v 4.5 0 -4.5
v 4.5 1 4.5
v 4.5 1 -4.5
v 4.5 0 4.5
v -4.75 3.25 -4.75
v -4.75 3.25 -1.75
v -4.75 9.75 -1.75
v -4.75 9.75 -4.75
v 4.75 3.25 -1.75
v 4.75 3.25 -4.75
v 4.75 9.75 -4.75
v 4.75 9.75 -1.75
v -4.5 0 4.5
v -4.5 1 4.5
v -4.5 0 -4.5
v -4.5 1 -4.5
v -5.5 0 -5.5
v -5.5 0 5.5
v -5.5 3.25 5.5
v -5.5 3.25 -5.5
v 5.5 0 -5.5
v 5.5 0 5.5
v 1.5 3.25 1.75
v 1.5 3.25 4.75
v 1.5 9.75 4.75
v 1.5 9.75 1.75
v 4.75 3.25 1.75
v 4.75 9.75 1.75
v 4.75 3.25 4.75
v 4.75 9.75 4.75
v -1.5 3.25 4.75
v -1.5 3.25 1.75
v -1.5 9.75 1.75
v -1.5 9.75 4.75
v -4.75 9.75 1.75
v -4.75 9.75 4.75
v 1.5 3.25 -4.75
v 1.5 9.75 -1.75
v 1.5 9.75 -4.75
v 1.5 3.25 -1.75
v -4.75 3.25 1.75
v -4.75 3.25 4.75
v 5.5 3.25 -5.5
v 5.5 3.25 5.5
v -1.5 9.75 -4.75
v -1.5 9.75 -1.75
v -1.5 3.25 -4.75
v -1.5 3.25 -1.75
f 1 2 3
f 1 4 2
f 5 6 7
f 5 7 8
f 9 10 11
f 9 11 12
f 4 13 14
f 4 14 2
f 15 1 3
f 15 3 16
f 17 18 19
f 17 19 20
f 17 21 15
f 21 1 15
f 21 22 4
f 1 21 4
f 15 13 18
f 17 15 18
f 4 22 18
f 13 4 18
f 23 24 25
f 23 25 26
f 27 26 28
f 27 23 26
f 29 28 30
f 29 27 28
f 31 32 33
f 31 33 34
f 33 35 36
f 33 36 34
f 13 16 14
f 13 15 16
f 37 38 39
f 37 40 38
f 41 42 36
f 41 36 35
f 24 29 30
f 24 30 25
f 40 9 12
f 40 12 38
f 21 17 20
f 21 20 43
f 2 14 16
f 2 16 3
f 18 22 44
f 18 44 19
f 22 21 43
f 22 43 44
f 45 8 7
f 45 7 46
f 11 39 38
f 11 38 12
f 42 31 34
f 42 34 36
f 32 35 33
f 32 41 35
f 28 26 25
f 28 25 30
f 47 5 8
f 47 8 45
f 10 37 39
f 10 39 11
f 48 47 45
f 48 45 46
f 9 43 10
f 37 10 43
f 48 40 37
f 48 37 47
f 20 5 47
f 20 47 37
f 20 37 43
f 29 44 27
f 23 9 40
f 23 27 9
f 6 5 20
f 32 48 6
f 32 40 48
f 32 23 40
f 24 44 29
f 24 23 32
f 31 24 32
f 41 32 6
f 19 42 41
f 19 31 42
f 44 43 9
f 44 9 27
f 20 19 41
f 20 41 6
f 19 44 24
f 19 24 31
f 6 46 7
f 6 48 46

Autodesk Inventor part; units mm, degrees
ref_plane "YZ Plane" through (0, 0, 0) normal (1, 0, 0) x (0, 1, 0)
ref_plane "XZ Plane" through (0, 0, 0) normal (0, 1, 0) x (-1, 0, 0)
ref_plane "XY Plane" through (0, 0, 0) normal (0, 0, 1) x (1, 0, 0)
sketch "Sketch1" plane through (0, 0, 0) normal (0, 1, 0) x (-1, 0, 0)
  line L0 (5.5, -5.5) -> (-5.5, -5.5)
  line L1 (-5.5, -5.5) -> (-5.5, 5.5)
  line L2 (-5.5, 5.5) -> (5.5, 5.5)
  line L3 (5.5, 5.5) -> (5.5, -5.5)
  line L4 (5.5, -5.5) -> (-5.5, 5.5) construction
  line L5 (-5.5, -5.5) -> (5.5, 5.5) construction
  point P0 (0, 0)
  dimension "d0" = 11
  dimension "d1" = 11
extrude "Extrusion1" add sketch "Sketch1" along normal blind 3.25
sketch "Sketch2" plane through (0, 0, 0) normal (0, -1, 0) x (1, 0, 0)
  line L0 (-4.5, 4.5) -> (4.5, 4.5)
  line L1 (4.5, 4.5) -> (4.5, -4.5)
  line L2 (4.5, -4.5) -> (-4.5, -4.5)
  line L3 (-4.5, -4.5) -> (-4.5, 4.5)
  line L4 (-4.5, 4.5) -> (4.5, -4.5) construction
  line L5 (4.5, 4.5) -> (-4.5, -4.5) construction
  point P0 (0, 0)
  dimension "d4" = 9
  dimension "d5" = 9
extrude "Extrusion2" cut sketch "Sketch2" against normal blind 1
sketch "Sketch3" plane through (0, 3.25, 0) normal (0, 1, 0) x (1, 0, 0)
  line L0 (-4.75, -1.75) -> (-1.5, -1.75)
  line L1 (-1.5, -1.75) -> (-1.5, -4.75)
  line L2 (-1.5, -4.75) -> (-4.75, -4.75)
  line L3 (-4.75, -4.75) -> (-4.75, -1.75)
  line L4 (-4.75, -1.75) -> (-1.5, -4.75) construction
  line L5 (-1.5, -1.75) -> (-4.75, -4.75) construction
  line L6 (-5.5, 5.5) -> (-5.5, -5.5) projected
  line L7 (-5.5, -5.5) -> (5.5, -5.5) projected
  line L8 (-4.75, 4.75) -> (-1.5, 4.75)
  line L9 (-4.75, 1.75) -> (-4.75, 4.75)
  line L10 (-1.5, 4.75) -> (-4.75, 1.75) construction
  line L11 (-1.5, 1.75) -> (-4.75, 1.75)
  line L12 (-1.5, 4.75) -> (-1.5, 1.75)
  line L13 (1.5, -1.75) -> (4.75, -1.75)
  line L14 (1.5, -4.75) -> (1.5, -1.75)
  line L15 (4.75, -1.75) -> (1.5, -4.75) construction
  line L16 (4.75, -4.75) -> (1.5, -4.75)
  line L17 (4.75, -1.75) -> (4.75, -4.75)
  line L18 (1.5, 4.75) -> (4.75, 4.75)
  line L19 (1.5, 1.75) -> (1.5, 4.75)
  line L20 (4.75, 4.75) -> (1.5, 1.75) construction
  line L21 (4.75, 1.75) -> (1.5, 1.75)
  line L22 (4.75, 4.75) -> (4.75, 1.75)
  point P0 (0, 0)
  point P1 (-3.125, -3.25)
  point P2 (-3.125, 3.25)
  point P3 (3.125, -3.25)
  point P4 (3.125, 3.25)
  dimension "d8" = 3.25
  dimension "d9" = 3
  dimension "d10" = 0.75
  dimension "d11" = 0.75
  dimension "d14" = 6.5
  dimension "d17" = 6.25
extrude "Extrusion3" add sketch "Sketch3" along normal blind 6.5
properties material "Brass, Soft Yellow, Welded"
